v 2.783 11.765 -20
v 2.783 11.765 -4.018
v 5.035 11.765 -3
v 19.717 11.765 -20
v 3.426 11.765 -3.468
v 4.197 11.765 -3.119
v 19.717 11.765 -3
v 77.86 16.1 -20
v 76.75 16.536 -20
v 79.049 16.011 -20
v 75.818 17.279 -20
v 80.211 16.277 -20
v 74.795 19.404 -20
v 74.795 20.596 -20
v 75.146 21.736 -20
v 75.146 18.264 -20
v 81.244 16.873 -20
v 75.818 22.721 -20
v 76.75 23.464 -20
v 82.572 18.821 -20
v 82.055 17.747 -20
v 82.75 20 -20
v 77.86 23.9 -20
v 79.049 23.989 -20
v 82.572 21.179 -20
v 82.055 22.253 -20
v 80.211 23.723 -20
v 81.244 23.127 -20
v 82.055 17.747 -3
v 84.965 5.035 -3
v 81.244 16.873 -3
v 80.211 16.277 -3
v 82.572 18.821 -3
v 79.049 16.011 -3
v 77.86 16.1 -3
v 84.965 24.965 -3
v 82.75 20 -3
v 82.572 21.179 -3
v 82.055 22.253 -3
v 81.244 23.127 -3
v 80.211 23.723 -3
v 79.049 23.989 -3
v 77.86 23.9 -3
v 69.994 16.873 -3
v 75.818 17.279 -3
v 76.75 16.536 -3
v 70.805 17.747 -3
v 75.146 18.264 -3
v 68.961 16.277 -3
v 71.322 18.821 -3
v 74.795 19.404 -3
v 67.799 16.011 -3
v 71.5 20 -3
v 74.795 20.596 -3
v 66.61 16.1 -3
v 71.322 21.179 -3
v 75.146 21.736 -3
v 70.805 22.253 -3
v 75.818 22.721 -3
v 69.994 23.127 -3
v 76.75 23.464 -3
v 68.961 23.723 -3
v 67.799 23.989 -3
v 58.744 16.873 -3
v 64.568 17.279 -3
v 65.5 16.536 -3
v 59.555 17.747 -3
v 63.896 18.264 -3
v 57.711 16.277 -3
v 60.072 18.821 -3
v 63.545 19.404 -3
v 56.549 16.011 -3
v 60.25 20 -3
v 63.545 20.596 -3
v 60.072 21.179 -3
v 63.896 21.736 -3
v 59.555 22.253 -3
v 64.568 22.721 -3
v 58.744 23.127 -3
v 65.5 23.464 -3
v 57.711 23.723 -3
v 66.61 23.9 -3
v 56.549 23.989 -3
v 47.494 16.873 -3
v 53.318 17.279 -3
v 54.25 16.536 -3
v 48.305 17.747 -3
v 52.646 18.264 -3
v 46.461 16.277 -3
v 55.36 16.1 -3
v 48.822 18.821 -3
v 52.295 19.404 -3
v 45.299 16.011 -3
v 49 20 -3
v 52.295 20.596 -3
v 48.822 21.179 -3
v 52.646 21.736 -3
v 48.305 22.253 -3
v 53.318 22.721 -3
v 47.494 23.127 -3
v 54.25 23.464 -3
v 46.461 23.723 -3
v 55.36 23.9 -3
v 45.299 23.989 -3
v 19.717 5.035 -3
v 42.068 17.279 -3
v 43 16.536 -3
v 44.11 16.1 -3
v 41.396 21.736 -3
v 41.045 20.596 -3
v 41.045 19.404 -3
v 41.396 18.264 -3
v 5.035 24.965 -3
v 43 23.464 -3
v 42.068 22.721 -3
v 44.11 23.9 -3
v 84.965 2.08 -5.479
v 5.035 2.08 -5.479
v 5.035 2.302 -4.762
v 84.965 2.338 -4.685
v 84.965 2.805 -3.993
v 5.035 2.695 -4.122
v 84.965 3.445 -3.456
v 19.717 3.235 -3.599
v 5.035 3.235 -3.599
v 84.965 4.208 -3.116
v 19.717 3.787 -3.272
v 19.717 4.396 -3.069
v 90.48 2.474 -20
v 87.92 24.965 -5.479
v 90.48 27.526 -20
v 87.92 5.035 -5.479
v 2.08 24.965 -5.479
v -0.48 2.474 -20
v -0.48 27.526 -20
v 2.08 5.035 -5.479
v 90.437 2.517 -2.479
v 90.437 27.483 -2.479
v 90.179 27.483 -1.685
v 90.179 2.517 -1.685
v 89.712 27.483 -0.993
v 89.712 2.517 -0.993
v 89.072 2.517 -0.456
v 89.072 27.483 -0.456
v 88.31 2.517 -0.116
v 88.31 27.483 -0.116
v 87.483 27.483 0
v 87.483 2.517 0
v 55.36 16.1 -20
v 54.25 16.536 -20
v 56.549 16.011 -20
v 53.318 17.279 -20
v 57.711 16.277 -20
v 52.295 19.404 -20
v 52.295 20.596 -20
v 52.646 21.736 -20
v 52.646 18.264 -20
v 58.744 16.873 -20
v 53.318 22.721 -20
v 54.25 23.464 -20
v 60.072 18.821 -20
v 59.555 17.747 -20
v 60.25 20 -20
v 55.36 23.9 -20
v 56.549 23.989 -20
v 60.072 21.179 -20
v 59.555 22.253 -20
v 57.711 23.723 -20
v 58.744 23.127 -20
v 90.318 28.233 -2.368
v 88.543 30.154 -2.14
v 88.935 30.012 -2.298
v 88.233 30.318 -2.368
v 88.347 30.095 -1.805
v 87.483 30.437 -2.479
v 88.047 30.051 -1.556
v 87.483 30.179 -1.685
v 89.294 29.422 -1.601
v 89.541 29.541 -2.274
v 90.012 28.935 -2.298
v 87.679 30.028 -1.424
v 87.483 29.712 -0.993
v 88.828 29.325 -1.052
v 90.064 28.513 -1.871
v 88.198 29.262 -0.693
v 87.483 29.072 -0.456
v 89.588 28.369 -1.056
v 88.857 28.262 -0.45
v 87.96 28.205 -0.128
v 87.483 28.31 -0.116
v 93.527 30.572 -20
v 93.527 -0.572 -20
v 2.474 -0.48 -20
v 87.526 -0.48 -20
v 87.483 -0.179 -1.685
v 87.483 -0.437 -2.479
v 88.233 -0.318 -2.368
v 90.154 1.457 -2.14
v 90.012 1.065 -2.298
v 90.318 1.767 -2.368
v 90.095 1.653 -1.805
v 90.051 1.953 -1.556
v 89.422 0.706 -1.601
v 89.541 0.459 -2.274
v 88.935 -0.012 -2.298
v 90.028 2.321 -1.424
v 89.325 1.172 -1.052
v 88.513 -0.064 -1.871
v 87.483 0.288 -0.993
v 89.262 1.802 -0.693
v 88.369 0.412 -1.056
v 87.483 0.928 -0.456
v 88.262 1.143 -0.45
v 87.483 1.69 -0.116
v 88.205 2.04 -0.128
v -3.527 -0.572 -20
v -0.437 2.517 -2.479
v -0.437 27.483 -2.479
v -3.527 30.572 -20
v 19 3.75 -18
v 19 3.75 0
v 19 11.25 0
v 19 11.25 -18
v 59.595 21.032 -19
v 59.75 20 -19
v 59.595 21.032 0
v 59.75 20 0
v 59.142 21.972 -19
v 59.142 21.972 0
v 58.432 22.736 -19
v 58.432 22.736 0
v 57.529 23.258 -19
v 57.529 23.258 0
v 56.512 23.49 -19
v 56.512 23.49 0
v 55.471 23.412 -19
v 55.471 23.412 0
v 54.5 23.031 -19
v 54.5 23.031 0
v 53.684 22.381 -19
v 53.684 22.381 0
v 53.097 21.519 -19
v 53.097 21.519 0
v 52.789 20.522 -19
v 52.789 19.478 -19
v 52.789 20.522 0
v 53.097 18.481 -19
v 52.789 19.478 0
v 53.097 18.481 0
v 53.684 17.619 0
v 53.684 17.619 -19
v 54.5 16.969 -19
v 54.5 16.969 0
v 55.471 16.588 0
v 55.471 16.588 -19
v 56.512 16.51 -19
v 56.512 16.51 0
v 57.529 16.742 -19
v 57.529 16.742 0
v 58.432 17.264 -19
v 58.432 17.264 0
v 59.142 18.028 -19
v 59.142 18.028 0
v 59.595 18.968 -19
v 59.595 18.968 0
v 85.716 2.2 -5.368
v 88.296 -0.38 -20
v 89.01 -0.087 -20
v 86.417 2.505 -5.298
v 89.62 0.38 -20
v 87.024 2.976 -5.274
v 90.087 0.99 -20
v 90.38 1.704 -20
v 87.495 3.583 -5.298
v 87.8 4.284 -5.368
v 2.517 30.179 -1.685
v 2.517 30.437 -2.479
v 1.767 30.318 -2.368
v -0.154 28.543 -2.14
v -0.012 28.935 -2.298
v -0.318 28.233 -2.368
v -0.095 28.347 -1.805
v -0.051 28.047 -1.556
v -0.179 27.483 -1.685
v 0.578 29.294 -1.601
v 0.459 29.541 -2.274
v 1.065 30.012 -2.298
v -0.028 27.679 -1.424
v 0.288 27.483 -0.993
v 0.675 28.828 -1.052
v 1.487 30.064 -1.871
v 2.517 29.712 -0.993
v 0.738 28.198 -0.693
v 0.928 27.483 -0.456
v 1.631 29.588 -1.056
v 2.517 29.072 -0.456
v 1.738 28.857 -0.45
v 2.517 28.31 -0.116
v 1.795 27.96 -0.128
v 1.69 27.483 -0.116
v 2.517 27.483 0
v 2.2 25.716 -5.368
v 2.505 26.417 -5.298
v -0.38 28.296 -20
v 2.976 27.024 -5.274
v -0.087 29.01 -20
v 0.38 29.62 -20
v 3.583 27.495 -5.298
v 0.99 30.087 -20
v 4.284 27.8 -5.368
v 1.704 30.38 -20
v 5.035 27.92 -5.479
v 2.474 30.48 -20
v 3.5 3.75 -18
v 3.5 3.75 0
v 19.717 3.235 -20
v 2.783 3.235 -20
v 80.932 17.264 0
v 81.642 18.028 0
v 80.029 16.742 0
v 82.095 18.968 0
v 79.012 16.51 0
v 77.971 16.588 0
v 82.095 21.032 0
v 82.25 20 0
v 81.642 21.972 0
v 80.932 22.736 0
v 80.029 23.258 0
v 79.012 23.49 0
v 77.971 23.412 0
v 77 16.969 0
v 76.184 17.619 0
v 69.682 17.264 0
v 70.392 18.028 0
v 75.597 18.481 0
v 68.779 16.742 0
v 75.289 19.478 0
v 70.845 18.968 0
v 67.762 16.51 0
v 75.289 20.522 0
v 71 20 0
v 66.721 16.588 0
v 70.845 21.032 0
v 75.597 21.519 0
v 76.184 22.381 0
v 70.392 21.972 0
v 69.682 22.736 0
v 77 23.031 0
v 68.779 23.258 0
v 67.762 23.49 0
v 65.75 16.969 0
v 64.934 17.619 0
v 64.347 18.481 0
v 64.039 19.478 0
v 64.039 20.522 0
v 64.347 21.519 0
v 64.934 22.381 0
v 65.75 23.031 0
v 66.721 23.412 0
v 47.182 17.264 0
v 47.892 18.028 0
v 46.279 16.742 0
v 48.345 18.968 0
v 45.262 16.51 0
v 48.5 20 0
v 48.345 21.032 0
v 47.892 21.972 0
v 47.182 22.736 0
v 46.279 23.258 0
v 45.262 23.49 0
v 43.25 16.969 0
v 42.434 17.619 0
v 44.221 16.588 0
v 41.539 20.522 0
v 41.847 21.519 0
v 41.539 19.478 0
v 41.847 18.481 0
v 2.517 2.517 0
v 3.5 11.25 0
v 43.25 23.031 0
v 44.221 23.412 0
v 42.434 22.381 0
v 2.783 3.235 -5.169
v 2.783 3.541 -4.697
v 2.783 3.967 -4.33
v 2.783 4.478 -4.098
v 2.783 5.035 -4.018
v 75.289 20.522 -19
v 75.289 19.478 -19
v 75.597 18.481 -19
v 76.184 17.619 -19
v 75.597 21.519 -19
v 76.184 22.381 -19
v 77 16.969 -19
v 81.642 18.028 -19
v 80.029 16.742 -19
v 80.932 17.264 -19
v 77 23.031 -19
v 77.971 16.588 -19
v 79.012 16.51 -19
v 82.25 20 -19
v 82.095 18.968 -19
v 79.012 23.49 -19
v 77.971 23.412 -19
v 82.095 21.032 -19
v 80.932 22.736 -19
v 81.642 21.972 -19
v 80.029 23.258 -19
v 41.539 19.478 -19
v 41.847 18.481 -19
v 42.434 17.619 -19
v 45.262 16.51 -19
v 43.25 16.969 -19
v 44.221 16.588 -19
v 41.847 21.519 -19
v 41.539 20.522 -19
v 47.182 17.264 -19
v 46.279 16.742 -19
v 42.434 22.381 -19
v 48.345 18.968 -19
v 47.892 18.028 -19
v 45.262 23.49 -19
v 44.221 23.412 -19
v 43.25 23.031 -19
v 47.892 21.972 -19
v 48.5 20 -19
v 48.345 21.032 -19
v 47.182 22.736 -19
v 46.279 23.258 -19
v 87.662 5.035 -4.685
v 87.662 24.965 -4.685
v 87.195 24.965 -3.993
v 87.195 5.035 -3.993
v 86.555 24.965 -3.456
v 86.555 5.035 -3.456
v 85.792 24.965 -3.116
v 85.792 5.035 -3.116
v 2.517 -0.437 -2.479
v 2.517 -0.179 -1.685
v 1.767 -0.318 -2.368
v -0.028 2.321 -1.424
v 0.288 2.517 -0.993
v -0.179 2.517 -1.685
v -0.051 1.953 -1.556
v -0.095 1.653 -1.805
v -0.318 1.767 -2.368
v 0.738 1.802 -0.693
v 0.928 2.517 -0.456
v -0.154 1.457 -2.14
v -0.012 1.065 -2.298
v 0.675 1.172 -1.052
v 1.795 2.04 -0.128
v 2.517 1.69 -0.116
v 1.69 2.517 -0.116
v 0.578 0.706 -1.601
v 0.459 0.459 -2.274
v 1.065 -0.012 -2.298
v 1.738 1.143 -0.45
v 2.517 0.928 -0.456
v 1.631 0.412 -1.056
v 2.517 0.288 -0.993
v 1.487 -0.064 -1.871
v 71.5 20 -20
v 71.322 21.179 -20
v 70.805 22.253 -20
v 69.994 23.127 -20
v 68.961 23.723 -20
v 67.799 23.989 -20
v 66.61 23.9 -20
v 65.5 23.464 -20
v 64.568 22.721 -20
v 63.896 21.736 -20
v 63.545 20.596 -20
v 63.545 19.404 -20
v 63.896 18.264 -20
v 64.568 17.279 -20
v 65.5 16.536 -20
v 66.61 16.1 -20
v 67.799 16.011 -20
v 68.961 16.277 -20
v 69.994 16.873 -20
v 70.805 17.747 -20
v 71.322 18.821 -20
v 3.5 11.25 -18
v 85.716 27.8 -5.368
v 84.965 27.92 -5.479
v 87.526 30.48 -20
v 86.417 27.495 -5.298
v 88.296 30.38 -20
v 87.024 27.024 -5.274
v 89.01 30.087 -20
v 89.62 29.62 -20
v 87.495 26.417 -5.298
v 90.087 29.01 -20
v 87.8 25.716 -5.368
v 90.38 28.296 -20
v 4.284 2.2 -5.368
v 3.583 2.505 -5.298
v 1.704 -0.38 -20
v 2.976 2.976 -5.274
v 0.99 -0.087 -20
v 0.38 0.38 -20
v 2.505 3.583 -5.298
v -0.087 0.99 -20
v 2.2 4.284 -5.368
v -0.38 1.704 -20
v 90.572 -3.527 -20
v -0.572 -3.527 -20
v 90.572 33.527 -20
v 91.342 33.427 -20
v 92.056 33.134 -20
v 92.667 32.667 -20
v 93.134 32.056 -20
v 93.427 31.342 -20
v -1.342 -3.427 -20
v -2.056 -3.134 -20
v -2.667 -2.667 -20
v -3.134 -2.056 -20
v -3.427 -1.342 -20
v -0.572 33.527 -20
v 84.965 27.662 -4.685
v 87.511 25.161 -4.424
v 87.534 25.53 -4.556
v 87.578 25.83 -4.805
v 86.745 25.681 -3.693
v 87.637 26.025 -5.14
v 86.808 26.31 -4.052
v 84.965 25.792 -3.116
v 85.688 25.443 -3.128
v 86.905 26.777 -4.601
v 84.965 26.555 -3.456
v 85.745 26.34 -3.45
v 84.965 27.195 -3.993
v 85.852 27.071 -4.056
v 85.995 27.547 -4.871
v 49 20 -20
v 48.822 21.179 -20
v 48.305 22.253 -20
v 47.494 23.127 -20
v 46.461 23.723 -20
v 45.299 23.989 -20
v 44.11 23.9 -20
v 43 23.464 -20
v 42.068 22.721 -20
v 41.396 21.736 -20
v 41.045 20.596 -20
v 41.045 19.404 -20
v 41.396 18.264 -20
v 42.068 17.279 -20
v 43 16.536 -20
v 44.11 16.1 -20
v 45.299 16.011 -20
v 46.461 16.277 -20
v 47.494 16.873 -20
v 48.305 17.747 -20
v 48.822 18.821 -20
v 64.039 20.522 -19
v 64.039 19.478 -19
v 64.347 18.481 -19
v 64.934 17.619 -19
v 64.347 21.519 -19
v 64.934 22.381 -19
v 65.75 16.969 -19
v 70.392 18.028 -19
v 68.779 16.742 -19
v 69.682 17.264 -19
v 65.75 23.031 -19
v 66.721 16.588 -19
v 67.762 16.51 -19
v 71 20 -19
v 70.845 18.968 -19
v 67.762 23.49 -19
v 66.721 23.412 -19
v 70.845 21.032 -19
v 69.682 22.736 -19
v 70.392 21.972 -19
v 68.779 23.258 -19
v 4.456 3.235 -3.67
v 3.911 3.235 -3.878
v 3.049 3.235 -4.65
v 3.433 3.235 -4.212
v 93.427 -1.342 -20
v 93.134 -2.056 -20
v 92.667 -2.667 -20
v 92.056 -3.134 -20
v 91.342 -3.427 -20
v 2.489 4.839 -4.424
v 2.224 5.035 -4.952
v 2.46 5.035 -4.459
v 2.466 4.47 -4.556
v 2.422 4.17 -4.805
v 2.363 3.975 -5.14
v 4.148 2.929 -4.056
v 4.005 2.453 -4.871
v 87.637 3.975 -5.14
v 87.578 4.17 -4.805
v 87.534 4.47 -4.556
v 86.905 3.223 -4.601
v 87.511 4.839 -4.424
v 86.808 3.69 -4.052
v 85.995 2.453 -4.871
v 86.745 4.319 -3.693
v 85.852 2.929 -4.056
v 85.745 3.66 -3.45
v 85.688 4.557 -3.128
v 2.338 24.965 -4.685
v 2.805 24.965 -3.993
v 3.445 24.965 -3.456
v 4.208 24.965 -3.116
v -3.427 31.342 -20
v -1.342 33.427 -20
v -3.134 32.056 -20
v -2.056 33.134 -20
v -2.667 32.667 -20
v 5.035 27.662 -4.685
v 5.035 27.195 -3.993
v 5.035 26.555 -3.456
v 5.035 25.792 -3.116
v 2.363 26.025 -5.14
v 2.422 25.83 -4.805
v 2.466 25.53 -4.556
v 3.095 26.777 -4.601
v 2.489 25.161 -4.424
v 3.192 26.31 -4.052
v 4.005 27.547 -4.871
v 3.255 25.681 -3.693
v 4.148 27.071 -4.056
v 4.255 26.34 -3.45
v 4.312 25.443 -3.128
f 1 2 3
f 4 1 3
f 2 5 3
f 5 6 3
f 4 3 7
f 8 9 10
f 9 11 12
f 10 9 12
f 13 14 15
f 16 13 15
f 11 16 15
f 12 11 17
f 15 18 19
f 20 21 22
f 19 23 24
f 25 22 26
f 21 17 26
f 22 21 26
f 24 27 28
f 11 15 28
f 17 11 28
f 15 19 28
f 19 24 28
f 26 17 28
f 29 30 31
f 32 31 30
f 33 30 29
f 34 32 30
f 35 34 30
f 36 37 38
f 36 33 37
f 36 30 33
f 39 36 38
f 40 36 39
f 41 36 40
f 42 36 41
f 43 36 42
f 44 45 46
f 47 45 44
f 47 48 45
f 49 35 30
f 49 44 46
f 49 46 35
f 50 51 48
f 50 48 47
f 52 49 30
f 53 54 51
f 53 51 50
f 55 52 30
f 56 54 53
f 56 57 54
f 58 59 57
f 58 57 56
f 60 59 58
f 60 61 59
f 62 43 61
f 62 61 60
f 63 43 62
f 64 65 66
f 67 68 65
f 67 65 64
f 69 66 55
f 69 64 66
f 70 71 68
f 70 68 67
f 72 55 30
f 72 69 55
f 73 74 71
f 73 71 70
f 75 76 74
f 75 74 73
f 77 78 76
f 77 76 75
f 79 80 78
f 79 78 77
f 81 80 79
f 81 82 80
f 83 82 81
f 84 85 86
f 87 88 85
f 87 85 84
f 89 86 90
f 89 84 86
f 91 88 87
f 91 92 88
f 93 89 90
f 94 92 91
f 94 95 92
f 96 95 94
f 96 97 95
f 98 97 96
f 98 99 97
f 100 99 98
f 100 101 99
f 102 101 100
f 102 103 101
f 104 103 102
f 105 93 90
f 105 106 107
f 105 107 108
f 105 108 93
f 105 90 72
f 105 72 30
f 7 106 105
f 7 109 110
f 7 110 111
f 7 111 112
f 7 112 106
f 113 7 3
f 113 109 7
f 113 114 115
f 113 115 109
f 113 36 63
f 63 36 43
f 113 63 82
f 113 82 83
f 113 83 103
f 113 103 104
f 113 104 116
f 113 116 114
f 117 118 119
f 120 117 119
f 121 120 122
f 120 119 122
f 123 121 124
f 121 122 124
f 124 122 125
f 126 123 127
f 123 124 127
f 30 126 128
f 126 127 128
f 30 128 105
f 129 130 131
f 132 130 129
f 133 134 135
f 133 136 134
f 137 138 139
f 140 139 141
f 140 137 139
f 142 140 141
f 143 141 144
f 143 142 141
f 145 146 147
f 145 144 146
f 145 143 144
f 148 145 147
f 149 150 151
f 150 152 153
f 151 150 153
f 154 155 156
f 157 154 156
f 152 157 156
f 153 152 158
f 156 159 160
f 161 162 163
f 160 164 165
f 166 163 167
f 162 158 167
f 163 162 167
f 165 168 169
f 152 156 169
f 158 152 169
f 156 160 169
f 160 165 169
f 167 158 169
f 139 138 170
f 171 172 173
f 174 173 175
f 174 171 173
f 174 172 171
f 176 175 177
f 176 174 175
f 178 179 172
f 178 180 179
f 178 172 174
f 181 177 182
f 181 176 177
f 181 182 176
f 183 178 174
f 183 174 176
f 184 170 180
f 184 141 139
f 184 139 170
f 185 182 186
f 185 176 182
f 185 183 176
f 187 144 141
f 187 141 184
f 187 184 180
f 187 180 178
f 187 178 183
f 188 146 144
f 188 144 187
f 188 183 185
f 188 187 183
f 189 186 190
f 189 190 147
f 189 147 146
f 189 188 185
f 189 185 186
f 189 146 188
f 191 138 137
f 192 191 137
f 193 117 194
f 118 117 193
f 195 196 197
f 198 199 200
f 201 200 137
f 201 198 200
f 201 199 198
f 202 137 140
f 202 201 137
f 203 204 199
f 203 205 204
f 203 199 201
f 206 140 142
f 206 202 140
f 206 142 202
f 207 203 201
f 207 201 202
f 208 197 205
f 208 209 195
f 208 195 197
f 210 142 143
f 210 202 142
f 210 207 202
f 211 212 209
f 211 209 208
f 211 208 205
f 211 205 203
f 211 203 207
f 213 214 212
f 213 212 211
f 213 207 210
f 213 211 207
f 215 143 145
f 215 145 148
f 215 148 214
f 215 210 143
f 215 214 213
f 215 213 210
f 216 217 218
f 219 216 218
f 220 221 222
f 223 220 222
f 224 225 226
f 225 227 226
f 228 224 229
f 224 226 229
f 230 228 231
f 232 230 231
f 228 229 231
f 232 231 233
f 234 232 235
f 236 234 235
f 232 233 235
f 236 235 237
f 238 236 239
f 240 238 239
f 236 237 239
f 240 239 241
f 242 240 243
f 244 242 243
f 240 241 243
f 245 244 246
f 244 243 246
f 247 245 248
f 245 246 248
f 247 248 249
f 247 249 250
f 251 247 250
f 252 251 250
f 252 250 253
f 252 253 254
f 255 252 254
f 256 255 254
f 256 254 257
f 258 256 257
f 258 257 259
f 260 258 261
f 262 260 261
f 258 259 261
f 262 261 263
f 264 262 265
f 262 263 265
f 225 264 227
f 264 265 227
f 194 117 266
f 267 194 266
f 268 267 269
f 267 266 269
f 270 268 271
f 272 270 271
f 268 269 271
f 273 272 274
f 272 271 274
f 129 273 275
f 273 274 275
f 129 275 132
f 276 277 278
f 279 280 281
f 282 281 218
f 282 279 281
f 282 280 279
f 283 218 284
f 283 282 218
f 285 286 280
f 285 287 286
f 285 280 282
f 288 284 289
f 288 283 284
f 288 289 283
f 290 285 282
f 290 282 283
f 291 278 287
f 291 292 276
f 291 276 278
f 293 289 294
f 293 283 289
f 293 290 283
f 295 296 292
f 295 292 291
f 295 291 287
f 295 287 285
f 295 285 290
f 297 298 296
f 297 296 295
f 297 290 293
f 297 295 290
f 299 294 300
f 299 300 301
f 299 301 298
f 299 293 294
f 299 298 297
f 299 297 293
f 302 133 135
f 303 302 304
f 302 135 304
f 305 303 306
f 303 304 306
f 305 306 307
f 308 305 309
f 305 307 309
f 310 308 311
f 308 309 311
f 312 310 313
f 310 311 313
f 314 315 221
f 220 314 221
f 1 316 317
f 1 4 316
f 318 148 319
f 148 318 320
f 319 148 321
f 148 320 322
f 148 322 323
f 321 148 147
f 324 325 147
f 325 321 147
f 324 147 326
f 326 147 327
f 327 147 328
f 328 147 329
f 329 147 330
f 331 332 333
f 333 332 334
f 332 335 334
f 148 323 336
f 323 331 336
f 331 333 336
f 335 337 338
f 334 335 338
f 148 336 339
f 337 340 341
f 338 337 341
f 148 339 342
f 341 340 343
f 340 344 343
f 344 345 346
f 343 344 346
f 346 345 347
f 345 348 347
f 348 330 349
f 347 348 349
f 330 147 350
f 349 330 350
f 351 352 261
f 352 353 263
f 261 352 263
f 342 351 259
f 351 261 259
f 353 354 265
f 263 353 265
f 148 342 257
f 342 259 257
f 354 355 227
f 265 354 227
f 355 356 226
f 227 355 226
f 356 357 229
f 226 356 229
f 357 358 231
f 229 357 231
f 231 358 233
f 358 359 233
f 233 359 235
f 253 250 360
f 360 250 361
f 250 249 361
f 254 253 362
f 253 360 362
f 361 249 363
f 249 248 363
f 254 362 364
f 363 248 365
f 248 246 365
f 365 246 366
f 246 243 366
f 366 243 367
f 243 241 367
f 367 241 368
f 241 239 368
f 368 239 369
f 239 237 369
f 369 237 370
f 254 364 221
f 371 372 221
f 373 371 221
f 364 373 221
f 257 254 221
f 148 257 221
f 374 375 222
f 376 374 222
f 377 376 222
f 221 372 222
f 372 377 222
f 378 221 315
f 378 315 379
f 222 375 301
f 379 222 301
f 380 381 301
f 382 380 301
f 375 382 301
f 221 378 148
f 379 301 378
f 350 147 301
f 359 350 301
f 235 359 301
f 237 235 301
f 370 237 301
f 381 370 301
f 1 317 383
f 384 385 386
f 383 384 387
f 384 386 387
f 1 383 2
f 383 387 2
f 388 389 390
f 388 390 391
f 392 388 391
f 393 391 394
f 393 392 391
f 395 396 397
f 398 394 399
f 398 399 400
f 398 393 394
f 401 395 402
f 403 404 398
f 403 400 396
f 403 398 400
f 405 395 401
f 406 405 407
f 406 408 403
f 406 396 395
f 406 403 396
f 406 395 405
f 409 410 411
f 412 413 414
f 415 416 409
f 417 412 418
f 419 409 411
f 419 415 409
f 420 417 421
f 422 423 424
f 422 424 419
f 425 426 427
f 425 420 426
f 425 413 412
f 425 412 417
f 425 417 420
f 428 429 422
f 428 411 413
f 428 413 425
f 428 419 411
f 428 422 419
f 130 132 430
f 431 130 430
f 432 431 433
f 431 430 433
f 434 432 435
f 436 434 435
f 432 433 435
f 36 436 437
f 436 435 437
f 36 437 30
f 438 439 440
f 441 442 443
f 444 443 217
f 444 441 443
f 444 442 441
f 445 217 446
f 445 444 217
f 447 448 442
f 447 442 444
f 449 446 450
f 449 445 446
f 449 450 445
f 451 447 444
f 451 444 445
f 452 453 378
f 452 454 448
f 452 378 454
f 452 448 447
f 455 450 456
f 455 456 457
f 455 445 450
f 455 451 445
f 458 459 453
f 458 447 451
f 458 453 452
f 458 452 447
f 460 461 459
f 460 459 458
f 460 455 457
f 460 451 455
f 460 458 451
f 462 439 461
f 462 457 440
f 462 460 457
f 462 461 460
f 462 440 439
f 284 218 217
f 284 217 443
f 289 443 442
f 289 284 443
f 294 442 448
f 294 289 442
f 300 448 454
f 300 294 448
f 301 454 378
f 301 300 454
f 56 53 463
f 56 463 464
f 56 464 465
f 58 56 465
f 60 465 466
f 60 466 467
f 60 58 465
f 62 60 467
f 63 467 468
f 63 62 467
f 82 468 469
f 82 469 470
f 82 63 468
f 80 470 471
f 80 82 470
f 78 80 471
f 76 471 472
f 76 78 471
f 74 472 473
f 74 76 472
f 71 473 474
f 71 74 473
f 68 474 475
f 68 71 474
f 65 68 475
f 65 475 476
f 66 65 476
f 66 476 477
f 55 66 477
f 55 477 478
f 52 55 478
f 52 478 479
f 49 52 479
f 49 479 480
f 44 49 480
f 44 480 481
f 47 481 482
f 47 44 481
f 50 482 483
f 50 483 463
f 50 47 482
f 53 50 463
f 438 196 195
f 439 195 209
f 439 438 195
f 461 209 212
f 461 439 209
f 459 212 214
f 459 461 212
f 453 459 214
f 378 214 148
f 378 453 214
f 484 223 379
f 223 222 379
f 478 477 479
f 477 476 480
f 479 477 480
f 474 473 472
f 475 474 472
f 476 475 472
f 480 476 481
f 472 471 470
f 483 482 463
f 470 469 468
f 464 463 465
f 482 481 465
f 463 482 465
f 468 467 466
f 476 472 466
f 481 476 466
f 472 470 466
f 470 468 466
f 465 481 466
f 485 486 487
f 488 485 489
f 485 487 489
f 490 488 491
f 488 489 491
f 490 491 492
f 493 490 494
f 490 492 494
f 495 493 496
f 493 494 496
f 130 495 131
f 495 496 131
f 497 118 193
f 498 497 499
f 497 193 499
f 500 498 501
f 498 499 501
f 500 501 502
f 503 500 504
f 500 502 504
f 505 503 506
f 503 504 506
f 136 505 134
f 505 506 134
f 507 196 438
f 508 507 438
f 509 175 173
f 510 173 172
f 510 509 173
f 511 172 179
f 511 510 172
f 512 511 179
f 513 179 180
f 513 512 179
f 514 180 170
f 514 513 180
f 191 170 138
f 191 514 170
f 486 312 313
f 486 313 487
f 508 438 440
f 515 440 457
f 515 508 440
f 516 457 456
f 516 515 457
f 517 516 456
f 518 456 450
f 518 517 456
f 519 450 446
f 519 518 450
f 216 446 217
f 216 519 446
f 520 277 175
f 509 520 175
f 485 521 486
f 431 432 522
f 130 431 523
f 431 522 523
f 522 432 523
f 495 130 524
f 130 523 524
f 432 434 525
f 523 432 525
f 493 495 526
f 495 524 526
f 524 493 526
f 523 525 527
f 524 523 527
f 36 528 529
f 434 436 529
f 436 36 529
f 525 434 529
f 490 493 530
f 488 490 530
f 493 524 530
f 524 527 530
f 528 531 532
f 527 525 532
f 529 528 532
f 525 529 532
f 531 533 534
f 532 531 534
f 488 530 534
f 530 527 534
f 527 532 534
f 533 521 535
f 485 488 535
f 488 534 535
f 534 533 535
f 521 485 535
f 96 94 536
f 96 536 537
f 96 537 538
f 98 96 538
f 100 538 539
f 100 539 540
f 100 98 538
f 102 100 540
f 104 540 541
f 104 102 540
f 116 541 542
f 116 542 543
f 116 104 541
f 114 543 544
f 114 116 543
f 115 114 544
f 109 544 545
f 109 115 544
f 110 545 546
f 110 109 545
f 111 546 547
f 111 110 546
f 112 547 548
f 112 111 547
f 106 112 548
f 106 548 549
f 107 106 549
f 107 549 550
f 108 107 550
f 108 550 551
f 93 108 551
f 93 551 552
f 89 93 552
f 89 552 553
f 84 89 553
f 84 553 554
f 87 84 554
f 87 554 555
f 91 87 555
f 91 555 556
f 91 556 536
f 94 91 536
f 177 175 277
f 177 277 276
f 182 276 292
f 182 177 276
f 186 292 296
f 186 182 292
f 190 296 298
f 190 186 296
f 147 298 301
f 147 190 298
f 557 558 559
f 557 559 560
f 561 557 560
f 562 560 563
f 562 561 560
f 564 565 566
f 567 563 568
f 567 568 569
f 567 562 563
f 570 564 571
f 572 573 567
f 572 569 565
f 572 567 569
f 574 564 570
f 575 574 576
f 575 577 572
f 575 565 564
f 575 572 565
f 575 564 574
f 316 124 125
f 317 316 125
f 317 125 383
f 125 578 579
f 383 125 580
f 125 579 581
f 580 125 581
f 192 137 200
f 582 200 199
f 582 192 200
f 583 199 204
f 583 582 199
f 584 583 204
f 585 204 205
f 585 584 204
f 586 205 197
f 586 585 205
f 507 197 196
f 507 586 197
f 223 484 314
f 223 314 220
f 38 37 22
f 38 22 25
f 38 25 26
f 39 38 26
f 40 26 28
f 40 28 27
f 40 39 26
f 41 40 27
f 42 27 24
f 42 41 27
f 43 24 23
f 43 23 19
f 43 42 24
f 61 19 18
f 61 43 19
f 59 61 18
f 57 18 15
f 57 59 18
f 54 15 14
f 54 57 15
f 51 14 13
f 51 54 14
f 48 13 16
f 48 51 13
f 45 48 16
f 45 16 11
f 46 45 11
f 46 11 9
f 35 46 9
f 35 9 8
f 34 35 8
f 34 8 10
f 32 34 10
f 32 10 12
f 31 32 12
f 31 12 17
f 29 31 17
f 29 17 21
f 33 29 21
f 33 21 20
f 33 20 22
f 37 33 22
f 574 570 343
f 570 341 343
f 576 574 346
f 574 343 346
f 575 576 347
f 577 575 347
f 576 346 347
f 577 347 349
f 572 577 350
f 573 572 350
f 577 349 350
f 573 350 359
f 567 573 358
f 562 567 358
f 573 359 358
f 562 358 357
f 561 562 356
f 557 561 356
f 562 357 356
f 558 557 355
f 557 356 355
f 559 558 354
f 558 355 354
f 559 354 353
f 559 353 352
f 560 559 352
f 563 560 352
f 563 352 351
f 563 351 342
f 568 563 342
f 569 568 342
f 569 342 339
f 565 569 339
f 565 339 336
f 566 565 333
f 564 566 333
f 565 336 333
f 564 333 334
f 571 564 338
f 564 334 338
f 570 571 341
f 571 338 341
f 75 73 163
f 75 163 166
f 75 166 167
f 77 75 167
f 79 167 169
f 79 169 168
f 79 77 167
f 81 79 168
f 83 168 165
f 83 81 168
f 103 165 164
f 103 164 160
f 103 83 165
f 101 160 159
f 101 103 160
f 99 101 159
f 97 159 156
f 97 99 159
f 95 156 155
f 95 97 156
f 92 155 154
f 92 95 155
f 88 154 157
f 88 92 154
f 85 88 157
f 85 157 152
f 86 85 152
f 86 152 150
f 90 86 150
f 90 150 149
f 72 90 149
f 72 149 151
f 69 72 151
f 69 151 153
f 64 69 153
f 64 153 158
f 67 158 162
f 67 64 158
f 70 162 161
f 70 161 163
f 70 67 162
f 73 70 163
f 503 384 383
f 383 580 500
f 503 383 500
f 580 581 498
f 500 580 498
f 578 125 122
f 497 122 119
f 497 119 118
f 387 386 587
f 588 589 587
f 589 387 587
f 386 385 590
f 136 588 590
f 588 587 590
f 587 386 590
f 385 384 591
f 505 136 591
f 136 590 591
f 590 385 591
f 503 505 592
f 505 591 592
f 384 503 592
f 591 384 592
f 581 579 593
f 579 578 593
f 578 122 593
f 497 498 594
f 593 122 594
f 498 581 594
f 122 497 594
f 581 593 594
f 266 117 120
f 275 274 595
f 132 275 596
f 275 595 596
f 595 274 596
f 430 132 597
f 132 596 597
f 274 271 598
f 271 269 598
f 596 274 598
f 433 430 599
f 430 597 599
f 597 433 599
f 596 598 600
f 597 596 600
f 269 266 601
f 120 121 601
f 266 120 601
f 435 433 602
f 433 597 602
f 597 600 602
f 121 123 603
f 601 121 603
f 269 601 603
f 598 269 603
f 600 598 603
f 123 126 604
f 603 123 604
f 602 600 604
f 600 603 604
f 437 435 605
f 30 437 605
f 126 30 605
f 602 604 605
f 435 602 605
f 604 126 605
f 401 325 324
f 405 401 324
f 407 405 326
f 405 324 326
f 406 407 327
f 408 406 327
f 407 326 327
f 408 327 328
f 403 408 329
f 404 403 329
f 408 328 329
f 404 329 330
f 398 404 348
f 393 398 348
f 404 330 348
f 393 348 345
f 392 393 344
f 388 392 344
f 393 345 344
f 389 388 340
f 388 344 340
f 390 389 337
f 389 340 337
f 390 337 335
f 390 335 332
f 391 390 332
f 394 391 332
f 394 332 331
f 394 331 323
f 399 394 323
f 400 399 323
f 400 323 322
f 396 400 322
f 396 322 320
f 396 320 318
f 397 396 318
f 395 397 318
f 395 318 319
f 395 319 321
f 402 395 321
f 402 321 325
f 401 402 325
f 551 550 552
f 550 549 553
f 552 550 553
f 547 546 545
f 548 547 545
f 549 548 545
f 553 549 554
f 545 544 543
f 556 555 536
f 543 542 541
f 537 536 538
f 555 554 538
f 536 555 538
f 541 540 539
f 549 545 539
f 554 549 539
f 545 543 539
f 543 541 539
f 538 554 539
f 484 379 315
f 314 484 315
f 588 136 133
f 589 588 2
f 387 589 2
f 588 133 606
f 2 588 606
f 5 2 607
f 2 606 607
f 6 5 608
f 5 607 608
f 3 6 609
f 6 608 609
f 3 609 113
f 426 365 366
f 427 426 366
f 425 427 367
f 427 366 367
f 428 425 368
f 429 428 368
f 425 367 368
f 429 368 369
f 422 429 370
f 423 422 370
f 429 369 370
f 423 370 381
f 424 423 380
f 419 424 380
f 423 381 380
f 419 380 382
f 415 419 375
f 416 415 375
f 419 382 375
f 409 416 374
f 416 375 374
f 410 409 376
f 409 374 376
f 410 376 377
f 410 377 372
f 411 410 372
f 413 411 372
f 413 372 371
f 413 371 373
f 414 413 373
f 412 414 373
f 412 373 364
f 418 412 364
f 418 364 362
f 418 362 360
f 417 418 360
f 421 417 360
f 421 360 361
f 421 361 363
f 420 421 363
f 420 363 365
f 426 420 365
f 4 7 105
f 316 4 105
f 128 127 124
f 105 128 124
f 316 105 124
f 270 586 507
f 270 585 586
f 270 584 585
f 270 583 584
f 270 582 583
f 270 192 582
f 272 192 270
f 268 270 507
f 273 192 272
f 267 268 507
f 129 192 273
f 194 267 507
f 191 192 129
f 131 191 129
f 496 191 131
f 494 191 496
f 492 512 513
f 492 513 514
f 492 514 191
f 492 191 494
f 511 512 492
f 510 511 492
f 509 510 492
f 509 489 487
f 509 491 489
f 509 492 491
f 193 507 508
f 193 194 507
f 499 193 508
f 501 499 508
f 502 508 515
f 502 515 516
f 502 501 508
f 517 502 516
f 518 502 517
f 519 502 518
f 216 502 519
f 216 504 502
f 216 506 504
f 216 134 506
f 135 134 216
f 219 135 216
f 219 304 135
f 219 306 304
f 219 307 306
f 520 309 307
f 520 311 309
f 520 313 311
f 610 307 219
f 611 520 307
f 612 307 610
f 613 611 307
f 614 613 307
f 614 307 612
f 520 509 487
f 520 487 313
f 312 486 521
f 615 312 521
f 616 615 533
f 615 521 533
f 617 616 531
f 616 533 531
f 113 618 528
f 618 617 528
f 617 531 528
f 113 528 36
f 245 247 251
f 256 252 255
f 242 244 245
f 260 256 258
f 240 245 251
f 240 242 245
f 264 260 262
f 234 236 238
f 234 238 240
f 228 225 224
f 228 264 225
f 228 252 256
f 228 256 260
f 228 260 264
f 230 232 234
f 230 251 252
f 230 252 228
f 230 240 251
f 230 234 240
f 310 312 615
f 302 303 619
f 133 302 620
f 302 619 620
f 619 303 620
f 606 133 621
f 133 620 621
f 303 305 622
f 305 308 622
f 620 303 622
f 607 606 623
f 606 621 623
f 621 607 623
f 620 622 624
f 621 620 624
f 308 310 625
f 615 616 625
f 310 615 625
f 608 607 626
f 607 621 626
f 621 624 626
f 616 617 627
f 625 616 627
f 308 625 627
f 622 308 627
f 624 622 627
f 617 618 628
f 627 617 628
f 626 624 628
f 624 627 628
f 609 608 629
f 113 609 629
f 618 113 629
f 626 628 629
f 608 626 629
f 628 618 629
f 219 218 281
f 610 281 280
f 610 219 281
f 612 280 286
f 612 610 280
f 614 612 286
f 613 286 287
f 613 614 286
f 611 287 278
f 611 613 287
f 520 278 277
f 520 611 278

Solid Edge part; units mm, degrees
sketch "Sketch1" plane through (0, 0, 0) normal (0, 0, 1) x (1, 0, 0)
  line L0 (90, 0) -> (0, 0)
  line L1 (0, 0) -> (0, 30)
  line L2 (0, 30) -> (90, 30)
  line L3 (90, 30) -> (90, 0)
extrude "Protrusion1" add sketch "Sketch1" against normal blind 20
draft "Draft_2" angle 10 neutral plane through (45, 15, 0) normal (0, 0, 1) pull direction (0, 0, 1) face at (75.9, 0, -16.4667) face at (90, 25.3, -16.4667) face at (0, 4.7, -16.4667) face at (14.1, 30, -16.4667)
shell "Thinwall_1" thickness 3 removed faces 1 at (78.3216, 3.0195, -20)
fillet "Round_1" radius 3 16 edges at (45, 0, 0) (91.7633, -1.7633, -10) (90, 15, 0) (45, 27.4827, -3) (45, 30, 0) (91.7633, 31.7633, -10) (-1.7633, 31.7633, -10) (0, 15, 0) (-1.7633, -1.7633, -10) (45, 2.5173, -3) (2.5173, 15, -3) (87.4827, 15, -3) (88.9815, 1.0185, -11.5) (1.0185, 1.0185, -11.5) (1.0185, 28.9815, -11.5) (88.9815, 28.9815, -11.5)
sketch "Sketch2" plane through (0, 0, 0) normal (0, 0, 1) x (1, 0, 0)
  circle A0 centre (45, 20) radius 4
extrude "ExtrudedProtrusion_3" add sketch "Sketch2" against normal blind 20
sketch "Sketch3" plane through (0, 0, 0) normal (0, 0, 1) x (1, 0, 0)
  circle A0 centre (78.75, 20) radius 4
  circle A1 centre (67.5, 20) radius 4
  circle A2 centre (56.25, 20) radius 4
extrude "ExtrudedProtrusion_4" add sketch "Sketch3" against normal blind 20
sketch "Sketch4" plane through (0, 0, 0) normal (0, 0, 1) x (1, 0, 0)
  circle A0 centre (78.75, 20) radius 3.5
  circle A1 centre (67.5, 20) radius 3.5
  circle A2 centre (56.25, 20) radius 3.5
  circle A3 centre (45, 20) radius 3.5
extrude "ExtrudedCutout_3" cut sketch "Sketch4" against normal blind 19
sketch "Sketch5" plane through (0, 0, 0) normal (0, 0, 1) x (1, 0, 0)
  line L0 (2.7826, 11.7647) -> (19.7174, 11.7647)
  line L1 (19.7174, 11.7647) -> (19.7174, 3.2353)
  line L2 (19.7174, 3.2353) -> (2.7826, 3.2353)
  line L3 (2.7826, 3.2353) -> (2.7826, 11.7647)
extrude "ExtrudedProtrusion_5" add sketch "Sketch5" against normal blind 20
sketch "Sketch6" plane through (0, 0, 0) normal (0, 0, 1) x (1, 0, 0)
  line L0 (19, 3.75) -> (19, 11.25)
  line L1 (19, 11.25) -> (3.5, 11.25)
  line L2 (3.5, 11.25) -> (3.5, 3.75)
  line L3 (3.5, 3.75) -> (19, 3.75)
extrude "ExtrudedCutout_4" cut sketch "Sketch6" against normal blind 18
